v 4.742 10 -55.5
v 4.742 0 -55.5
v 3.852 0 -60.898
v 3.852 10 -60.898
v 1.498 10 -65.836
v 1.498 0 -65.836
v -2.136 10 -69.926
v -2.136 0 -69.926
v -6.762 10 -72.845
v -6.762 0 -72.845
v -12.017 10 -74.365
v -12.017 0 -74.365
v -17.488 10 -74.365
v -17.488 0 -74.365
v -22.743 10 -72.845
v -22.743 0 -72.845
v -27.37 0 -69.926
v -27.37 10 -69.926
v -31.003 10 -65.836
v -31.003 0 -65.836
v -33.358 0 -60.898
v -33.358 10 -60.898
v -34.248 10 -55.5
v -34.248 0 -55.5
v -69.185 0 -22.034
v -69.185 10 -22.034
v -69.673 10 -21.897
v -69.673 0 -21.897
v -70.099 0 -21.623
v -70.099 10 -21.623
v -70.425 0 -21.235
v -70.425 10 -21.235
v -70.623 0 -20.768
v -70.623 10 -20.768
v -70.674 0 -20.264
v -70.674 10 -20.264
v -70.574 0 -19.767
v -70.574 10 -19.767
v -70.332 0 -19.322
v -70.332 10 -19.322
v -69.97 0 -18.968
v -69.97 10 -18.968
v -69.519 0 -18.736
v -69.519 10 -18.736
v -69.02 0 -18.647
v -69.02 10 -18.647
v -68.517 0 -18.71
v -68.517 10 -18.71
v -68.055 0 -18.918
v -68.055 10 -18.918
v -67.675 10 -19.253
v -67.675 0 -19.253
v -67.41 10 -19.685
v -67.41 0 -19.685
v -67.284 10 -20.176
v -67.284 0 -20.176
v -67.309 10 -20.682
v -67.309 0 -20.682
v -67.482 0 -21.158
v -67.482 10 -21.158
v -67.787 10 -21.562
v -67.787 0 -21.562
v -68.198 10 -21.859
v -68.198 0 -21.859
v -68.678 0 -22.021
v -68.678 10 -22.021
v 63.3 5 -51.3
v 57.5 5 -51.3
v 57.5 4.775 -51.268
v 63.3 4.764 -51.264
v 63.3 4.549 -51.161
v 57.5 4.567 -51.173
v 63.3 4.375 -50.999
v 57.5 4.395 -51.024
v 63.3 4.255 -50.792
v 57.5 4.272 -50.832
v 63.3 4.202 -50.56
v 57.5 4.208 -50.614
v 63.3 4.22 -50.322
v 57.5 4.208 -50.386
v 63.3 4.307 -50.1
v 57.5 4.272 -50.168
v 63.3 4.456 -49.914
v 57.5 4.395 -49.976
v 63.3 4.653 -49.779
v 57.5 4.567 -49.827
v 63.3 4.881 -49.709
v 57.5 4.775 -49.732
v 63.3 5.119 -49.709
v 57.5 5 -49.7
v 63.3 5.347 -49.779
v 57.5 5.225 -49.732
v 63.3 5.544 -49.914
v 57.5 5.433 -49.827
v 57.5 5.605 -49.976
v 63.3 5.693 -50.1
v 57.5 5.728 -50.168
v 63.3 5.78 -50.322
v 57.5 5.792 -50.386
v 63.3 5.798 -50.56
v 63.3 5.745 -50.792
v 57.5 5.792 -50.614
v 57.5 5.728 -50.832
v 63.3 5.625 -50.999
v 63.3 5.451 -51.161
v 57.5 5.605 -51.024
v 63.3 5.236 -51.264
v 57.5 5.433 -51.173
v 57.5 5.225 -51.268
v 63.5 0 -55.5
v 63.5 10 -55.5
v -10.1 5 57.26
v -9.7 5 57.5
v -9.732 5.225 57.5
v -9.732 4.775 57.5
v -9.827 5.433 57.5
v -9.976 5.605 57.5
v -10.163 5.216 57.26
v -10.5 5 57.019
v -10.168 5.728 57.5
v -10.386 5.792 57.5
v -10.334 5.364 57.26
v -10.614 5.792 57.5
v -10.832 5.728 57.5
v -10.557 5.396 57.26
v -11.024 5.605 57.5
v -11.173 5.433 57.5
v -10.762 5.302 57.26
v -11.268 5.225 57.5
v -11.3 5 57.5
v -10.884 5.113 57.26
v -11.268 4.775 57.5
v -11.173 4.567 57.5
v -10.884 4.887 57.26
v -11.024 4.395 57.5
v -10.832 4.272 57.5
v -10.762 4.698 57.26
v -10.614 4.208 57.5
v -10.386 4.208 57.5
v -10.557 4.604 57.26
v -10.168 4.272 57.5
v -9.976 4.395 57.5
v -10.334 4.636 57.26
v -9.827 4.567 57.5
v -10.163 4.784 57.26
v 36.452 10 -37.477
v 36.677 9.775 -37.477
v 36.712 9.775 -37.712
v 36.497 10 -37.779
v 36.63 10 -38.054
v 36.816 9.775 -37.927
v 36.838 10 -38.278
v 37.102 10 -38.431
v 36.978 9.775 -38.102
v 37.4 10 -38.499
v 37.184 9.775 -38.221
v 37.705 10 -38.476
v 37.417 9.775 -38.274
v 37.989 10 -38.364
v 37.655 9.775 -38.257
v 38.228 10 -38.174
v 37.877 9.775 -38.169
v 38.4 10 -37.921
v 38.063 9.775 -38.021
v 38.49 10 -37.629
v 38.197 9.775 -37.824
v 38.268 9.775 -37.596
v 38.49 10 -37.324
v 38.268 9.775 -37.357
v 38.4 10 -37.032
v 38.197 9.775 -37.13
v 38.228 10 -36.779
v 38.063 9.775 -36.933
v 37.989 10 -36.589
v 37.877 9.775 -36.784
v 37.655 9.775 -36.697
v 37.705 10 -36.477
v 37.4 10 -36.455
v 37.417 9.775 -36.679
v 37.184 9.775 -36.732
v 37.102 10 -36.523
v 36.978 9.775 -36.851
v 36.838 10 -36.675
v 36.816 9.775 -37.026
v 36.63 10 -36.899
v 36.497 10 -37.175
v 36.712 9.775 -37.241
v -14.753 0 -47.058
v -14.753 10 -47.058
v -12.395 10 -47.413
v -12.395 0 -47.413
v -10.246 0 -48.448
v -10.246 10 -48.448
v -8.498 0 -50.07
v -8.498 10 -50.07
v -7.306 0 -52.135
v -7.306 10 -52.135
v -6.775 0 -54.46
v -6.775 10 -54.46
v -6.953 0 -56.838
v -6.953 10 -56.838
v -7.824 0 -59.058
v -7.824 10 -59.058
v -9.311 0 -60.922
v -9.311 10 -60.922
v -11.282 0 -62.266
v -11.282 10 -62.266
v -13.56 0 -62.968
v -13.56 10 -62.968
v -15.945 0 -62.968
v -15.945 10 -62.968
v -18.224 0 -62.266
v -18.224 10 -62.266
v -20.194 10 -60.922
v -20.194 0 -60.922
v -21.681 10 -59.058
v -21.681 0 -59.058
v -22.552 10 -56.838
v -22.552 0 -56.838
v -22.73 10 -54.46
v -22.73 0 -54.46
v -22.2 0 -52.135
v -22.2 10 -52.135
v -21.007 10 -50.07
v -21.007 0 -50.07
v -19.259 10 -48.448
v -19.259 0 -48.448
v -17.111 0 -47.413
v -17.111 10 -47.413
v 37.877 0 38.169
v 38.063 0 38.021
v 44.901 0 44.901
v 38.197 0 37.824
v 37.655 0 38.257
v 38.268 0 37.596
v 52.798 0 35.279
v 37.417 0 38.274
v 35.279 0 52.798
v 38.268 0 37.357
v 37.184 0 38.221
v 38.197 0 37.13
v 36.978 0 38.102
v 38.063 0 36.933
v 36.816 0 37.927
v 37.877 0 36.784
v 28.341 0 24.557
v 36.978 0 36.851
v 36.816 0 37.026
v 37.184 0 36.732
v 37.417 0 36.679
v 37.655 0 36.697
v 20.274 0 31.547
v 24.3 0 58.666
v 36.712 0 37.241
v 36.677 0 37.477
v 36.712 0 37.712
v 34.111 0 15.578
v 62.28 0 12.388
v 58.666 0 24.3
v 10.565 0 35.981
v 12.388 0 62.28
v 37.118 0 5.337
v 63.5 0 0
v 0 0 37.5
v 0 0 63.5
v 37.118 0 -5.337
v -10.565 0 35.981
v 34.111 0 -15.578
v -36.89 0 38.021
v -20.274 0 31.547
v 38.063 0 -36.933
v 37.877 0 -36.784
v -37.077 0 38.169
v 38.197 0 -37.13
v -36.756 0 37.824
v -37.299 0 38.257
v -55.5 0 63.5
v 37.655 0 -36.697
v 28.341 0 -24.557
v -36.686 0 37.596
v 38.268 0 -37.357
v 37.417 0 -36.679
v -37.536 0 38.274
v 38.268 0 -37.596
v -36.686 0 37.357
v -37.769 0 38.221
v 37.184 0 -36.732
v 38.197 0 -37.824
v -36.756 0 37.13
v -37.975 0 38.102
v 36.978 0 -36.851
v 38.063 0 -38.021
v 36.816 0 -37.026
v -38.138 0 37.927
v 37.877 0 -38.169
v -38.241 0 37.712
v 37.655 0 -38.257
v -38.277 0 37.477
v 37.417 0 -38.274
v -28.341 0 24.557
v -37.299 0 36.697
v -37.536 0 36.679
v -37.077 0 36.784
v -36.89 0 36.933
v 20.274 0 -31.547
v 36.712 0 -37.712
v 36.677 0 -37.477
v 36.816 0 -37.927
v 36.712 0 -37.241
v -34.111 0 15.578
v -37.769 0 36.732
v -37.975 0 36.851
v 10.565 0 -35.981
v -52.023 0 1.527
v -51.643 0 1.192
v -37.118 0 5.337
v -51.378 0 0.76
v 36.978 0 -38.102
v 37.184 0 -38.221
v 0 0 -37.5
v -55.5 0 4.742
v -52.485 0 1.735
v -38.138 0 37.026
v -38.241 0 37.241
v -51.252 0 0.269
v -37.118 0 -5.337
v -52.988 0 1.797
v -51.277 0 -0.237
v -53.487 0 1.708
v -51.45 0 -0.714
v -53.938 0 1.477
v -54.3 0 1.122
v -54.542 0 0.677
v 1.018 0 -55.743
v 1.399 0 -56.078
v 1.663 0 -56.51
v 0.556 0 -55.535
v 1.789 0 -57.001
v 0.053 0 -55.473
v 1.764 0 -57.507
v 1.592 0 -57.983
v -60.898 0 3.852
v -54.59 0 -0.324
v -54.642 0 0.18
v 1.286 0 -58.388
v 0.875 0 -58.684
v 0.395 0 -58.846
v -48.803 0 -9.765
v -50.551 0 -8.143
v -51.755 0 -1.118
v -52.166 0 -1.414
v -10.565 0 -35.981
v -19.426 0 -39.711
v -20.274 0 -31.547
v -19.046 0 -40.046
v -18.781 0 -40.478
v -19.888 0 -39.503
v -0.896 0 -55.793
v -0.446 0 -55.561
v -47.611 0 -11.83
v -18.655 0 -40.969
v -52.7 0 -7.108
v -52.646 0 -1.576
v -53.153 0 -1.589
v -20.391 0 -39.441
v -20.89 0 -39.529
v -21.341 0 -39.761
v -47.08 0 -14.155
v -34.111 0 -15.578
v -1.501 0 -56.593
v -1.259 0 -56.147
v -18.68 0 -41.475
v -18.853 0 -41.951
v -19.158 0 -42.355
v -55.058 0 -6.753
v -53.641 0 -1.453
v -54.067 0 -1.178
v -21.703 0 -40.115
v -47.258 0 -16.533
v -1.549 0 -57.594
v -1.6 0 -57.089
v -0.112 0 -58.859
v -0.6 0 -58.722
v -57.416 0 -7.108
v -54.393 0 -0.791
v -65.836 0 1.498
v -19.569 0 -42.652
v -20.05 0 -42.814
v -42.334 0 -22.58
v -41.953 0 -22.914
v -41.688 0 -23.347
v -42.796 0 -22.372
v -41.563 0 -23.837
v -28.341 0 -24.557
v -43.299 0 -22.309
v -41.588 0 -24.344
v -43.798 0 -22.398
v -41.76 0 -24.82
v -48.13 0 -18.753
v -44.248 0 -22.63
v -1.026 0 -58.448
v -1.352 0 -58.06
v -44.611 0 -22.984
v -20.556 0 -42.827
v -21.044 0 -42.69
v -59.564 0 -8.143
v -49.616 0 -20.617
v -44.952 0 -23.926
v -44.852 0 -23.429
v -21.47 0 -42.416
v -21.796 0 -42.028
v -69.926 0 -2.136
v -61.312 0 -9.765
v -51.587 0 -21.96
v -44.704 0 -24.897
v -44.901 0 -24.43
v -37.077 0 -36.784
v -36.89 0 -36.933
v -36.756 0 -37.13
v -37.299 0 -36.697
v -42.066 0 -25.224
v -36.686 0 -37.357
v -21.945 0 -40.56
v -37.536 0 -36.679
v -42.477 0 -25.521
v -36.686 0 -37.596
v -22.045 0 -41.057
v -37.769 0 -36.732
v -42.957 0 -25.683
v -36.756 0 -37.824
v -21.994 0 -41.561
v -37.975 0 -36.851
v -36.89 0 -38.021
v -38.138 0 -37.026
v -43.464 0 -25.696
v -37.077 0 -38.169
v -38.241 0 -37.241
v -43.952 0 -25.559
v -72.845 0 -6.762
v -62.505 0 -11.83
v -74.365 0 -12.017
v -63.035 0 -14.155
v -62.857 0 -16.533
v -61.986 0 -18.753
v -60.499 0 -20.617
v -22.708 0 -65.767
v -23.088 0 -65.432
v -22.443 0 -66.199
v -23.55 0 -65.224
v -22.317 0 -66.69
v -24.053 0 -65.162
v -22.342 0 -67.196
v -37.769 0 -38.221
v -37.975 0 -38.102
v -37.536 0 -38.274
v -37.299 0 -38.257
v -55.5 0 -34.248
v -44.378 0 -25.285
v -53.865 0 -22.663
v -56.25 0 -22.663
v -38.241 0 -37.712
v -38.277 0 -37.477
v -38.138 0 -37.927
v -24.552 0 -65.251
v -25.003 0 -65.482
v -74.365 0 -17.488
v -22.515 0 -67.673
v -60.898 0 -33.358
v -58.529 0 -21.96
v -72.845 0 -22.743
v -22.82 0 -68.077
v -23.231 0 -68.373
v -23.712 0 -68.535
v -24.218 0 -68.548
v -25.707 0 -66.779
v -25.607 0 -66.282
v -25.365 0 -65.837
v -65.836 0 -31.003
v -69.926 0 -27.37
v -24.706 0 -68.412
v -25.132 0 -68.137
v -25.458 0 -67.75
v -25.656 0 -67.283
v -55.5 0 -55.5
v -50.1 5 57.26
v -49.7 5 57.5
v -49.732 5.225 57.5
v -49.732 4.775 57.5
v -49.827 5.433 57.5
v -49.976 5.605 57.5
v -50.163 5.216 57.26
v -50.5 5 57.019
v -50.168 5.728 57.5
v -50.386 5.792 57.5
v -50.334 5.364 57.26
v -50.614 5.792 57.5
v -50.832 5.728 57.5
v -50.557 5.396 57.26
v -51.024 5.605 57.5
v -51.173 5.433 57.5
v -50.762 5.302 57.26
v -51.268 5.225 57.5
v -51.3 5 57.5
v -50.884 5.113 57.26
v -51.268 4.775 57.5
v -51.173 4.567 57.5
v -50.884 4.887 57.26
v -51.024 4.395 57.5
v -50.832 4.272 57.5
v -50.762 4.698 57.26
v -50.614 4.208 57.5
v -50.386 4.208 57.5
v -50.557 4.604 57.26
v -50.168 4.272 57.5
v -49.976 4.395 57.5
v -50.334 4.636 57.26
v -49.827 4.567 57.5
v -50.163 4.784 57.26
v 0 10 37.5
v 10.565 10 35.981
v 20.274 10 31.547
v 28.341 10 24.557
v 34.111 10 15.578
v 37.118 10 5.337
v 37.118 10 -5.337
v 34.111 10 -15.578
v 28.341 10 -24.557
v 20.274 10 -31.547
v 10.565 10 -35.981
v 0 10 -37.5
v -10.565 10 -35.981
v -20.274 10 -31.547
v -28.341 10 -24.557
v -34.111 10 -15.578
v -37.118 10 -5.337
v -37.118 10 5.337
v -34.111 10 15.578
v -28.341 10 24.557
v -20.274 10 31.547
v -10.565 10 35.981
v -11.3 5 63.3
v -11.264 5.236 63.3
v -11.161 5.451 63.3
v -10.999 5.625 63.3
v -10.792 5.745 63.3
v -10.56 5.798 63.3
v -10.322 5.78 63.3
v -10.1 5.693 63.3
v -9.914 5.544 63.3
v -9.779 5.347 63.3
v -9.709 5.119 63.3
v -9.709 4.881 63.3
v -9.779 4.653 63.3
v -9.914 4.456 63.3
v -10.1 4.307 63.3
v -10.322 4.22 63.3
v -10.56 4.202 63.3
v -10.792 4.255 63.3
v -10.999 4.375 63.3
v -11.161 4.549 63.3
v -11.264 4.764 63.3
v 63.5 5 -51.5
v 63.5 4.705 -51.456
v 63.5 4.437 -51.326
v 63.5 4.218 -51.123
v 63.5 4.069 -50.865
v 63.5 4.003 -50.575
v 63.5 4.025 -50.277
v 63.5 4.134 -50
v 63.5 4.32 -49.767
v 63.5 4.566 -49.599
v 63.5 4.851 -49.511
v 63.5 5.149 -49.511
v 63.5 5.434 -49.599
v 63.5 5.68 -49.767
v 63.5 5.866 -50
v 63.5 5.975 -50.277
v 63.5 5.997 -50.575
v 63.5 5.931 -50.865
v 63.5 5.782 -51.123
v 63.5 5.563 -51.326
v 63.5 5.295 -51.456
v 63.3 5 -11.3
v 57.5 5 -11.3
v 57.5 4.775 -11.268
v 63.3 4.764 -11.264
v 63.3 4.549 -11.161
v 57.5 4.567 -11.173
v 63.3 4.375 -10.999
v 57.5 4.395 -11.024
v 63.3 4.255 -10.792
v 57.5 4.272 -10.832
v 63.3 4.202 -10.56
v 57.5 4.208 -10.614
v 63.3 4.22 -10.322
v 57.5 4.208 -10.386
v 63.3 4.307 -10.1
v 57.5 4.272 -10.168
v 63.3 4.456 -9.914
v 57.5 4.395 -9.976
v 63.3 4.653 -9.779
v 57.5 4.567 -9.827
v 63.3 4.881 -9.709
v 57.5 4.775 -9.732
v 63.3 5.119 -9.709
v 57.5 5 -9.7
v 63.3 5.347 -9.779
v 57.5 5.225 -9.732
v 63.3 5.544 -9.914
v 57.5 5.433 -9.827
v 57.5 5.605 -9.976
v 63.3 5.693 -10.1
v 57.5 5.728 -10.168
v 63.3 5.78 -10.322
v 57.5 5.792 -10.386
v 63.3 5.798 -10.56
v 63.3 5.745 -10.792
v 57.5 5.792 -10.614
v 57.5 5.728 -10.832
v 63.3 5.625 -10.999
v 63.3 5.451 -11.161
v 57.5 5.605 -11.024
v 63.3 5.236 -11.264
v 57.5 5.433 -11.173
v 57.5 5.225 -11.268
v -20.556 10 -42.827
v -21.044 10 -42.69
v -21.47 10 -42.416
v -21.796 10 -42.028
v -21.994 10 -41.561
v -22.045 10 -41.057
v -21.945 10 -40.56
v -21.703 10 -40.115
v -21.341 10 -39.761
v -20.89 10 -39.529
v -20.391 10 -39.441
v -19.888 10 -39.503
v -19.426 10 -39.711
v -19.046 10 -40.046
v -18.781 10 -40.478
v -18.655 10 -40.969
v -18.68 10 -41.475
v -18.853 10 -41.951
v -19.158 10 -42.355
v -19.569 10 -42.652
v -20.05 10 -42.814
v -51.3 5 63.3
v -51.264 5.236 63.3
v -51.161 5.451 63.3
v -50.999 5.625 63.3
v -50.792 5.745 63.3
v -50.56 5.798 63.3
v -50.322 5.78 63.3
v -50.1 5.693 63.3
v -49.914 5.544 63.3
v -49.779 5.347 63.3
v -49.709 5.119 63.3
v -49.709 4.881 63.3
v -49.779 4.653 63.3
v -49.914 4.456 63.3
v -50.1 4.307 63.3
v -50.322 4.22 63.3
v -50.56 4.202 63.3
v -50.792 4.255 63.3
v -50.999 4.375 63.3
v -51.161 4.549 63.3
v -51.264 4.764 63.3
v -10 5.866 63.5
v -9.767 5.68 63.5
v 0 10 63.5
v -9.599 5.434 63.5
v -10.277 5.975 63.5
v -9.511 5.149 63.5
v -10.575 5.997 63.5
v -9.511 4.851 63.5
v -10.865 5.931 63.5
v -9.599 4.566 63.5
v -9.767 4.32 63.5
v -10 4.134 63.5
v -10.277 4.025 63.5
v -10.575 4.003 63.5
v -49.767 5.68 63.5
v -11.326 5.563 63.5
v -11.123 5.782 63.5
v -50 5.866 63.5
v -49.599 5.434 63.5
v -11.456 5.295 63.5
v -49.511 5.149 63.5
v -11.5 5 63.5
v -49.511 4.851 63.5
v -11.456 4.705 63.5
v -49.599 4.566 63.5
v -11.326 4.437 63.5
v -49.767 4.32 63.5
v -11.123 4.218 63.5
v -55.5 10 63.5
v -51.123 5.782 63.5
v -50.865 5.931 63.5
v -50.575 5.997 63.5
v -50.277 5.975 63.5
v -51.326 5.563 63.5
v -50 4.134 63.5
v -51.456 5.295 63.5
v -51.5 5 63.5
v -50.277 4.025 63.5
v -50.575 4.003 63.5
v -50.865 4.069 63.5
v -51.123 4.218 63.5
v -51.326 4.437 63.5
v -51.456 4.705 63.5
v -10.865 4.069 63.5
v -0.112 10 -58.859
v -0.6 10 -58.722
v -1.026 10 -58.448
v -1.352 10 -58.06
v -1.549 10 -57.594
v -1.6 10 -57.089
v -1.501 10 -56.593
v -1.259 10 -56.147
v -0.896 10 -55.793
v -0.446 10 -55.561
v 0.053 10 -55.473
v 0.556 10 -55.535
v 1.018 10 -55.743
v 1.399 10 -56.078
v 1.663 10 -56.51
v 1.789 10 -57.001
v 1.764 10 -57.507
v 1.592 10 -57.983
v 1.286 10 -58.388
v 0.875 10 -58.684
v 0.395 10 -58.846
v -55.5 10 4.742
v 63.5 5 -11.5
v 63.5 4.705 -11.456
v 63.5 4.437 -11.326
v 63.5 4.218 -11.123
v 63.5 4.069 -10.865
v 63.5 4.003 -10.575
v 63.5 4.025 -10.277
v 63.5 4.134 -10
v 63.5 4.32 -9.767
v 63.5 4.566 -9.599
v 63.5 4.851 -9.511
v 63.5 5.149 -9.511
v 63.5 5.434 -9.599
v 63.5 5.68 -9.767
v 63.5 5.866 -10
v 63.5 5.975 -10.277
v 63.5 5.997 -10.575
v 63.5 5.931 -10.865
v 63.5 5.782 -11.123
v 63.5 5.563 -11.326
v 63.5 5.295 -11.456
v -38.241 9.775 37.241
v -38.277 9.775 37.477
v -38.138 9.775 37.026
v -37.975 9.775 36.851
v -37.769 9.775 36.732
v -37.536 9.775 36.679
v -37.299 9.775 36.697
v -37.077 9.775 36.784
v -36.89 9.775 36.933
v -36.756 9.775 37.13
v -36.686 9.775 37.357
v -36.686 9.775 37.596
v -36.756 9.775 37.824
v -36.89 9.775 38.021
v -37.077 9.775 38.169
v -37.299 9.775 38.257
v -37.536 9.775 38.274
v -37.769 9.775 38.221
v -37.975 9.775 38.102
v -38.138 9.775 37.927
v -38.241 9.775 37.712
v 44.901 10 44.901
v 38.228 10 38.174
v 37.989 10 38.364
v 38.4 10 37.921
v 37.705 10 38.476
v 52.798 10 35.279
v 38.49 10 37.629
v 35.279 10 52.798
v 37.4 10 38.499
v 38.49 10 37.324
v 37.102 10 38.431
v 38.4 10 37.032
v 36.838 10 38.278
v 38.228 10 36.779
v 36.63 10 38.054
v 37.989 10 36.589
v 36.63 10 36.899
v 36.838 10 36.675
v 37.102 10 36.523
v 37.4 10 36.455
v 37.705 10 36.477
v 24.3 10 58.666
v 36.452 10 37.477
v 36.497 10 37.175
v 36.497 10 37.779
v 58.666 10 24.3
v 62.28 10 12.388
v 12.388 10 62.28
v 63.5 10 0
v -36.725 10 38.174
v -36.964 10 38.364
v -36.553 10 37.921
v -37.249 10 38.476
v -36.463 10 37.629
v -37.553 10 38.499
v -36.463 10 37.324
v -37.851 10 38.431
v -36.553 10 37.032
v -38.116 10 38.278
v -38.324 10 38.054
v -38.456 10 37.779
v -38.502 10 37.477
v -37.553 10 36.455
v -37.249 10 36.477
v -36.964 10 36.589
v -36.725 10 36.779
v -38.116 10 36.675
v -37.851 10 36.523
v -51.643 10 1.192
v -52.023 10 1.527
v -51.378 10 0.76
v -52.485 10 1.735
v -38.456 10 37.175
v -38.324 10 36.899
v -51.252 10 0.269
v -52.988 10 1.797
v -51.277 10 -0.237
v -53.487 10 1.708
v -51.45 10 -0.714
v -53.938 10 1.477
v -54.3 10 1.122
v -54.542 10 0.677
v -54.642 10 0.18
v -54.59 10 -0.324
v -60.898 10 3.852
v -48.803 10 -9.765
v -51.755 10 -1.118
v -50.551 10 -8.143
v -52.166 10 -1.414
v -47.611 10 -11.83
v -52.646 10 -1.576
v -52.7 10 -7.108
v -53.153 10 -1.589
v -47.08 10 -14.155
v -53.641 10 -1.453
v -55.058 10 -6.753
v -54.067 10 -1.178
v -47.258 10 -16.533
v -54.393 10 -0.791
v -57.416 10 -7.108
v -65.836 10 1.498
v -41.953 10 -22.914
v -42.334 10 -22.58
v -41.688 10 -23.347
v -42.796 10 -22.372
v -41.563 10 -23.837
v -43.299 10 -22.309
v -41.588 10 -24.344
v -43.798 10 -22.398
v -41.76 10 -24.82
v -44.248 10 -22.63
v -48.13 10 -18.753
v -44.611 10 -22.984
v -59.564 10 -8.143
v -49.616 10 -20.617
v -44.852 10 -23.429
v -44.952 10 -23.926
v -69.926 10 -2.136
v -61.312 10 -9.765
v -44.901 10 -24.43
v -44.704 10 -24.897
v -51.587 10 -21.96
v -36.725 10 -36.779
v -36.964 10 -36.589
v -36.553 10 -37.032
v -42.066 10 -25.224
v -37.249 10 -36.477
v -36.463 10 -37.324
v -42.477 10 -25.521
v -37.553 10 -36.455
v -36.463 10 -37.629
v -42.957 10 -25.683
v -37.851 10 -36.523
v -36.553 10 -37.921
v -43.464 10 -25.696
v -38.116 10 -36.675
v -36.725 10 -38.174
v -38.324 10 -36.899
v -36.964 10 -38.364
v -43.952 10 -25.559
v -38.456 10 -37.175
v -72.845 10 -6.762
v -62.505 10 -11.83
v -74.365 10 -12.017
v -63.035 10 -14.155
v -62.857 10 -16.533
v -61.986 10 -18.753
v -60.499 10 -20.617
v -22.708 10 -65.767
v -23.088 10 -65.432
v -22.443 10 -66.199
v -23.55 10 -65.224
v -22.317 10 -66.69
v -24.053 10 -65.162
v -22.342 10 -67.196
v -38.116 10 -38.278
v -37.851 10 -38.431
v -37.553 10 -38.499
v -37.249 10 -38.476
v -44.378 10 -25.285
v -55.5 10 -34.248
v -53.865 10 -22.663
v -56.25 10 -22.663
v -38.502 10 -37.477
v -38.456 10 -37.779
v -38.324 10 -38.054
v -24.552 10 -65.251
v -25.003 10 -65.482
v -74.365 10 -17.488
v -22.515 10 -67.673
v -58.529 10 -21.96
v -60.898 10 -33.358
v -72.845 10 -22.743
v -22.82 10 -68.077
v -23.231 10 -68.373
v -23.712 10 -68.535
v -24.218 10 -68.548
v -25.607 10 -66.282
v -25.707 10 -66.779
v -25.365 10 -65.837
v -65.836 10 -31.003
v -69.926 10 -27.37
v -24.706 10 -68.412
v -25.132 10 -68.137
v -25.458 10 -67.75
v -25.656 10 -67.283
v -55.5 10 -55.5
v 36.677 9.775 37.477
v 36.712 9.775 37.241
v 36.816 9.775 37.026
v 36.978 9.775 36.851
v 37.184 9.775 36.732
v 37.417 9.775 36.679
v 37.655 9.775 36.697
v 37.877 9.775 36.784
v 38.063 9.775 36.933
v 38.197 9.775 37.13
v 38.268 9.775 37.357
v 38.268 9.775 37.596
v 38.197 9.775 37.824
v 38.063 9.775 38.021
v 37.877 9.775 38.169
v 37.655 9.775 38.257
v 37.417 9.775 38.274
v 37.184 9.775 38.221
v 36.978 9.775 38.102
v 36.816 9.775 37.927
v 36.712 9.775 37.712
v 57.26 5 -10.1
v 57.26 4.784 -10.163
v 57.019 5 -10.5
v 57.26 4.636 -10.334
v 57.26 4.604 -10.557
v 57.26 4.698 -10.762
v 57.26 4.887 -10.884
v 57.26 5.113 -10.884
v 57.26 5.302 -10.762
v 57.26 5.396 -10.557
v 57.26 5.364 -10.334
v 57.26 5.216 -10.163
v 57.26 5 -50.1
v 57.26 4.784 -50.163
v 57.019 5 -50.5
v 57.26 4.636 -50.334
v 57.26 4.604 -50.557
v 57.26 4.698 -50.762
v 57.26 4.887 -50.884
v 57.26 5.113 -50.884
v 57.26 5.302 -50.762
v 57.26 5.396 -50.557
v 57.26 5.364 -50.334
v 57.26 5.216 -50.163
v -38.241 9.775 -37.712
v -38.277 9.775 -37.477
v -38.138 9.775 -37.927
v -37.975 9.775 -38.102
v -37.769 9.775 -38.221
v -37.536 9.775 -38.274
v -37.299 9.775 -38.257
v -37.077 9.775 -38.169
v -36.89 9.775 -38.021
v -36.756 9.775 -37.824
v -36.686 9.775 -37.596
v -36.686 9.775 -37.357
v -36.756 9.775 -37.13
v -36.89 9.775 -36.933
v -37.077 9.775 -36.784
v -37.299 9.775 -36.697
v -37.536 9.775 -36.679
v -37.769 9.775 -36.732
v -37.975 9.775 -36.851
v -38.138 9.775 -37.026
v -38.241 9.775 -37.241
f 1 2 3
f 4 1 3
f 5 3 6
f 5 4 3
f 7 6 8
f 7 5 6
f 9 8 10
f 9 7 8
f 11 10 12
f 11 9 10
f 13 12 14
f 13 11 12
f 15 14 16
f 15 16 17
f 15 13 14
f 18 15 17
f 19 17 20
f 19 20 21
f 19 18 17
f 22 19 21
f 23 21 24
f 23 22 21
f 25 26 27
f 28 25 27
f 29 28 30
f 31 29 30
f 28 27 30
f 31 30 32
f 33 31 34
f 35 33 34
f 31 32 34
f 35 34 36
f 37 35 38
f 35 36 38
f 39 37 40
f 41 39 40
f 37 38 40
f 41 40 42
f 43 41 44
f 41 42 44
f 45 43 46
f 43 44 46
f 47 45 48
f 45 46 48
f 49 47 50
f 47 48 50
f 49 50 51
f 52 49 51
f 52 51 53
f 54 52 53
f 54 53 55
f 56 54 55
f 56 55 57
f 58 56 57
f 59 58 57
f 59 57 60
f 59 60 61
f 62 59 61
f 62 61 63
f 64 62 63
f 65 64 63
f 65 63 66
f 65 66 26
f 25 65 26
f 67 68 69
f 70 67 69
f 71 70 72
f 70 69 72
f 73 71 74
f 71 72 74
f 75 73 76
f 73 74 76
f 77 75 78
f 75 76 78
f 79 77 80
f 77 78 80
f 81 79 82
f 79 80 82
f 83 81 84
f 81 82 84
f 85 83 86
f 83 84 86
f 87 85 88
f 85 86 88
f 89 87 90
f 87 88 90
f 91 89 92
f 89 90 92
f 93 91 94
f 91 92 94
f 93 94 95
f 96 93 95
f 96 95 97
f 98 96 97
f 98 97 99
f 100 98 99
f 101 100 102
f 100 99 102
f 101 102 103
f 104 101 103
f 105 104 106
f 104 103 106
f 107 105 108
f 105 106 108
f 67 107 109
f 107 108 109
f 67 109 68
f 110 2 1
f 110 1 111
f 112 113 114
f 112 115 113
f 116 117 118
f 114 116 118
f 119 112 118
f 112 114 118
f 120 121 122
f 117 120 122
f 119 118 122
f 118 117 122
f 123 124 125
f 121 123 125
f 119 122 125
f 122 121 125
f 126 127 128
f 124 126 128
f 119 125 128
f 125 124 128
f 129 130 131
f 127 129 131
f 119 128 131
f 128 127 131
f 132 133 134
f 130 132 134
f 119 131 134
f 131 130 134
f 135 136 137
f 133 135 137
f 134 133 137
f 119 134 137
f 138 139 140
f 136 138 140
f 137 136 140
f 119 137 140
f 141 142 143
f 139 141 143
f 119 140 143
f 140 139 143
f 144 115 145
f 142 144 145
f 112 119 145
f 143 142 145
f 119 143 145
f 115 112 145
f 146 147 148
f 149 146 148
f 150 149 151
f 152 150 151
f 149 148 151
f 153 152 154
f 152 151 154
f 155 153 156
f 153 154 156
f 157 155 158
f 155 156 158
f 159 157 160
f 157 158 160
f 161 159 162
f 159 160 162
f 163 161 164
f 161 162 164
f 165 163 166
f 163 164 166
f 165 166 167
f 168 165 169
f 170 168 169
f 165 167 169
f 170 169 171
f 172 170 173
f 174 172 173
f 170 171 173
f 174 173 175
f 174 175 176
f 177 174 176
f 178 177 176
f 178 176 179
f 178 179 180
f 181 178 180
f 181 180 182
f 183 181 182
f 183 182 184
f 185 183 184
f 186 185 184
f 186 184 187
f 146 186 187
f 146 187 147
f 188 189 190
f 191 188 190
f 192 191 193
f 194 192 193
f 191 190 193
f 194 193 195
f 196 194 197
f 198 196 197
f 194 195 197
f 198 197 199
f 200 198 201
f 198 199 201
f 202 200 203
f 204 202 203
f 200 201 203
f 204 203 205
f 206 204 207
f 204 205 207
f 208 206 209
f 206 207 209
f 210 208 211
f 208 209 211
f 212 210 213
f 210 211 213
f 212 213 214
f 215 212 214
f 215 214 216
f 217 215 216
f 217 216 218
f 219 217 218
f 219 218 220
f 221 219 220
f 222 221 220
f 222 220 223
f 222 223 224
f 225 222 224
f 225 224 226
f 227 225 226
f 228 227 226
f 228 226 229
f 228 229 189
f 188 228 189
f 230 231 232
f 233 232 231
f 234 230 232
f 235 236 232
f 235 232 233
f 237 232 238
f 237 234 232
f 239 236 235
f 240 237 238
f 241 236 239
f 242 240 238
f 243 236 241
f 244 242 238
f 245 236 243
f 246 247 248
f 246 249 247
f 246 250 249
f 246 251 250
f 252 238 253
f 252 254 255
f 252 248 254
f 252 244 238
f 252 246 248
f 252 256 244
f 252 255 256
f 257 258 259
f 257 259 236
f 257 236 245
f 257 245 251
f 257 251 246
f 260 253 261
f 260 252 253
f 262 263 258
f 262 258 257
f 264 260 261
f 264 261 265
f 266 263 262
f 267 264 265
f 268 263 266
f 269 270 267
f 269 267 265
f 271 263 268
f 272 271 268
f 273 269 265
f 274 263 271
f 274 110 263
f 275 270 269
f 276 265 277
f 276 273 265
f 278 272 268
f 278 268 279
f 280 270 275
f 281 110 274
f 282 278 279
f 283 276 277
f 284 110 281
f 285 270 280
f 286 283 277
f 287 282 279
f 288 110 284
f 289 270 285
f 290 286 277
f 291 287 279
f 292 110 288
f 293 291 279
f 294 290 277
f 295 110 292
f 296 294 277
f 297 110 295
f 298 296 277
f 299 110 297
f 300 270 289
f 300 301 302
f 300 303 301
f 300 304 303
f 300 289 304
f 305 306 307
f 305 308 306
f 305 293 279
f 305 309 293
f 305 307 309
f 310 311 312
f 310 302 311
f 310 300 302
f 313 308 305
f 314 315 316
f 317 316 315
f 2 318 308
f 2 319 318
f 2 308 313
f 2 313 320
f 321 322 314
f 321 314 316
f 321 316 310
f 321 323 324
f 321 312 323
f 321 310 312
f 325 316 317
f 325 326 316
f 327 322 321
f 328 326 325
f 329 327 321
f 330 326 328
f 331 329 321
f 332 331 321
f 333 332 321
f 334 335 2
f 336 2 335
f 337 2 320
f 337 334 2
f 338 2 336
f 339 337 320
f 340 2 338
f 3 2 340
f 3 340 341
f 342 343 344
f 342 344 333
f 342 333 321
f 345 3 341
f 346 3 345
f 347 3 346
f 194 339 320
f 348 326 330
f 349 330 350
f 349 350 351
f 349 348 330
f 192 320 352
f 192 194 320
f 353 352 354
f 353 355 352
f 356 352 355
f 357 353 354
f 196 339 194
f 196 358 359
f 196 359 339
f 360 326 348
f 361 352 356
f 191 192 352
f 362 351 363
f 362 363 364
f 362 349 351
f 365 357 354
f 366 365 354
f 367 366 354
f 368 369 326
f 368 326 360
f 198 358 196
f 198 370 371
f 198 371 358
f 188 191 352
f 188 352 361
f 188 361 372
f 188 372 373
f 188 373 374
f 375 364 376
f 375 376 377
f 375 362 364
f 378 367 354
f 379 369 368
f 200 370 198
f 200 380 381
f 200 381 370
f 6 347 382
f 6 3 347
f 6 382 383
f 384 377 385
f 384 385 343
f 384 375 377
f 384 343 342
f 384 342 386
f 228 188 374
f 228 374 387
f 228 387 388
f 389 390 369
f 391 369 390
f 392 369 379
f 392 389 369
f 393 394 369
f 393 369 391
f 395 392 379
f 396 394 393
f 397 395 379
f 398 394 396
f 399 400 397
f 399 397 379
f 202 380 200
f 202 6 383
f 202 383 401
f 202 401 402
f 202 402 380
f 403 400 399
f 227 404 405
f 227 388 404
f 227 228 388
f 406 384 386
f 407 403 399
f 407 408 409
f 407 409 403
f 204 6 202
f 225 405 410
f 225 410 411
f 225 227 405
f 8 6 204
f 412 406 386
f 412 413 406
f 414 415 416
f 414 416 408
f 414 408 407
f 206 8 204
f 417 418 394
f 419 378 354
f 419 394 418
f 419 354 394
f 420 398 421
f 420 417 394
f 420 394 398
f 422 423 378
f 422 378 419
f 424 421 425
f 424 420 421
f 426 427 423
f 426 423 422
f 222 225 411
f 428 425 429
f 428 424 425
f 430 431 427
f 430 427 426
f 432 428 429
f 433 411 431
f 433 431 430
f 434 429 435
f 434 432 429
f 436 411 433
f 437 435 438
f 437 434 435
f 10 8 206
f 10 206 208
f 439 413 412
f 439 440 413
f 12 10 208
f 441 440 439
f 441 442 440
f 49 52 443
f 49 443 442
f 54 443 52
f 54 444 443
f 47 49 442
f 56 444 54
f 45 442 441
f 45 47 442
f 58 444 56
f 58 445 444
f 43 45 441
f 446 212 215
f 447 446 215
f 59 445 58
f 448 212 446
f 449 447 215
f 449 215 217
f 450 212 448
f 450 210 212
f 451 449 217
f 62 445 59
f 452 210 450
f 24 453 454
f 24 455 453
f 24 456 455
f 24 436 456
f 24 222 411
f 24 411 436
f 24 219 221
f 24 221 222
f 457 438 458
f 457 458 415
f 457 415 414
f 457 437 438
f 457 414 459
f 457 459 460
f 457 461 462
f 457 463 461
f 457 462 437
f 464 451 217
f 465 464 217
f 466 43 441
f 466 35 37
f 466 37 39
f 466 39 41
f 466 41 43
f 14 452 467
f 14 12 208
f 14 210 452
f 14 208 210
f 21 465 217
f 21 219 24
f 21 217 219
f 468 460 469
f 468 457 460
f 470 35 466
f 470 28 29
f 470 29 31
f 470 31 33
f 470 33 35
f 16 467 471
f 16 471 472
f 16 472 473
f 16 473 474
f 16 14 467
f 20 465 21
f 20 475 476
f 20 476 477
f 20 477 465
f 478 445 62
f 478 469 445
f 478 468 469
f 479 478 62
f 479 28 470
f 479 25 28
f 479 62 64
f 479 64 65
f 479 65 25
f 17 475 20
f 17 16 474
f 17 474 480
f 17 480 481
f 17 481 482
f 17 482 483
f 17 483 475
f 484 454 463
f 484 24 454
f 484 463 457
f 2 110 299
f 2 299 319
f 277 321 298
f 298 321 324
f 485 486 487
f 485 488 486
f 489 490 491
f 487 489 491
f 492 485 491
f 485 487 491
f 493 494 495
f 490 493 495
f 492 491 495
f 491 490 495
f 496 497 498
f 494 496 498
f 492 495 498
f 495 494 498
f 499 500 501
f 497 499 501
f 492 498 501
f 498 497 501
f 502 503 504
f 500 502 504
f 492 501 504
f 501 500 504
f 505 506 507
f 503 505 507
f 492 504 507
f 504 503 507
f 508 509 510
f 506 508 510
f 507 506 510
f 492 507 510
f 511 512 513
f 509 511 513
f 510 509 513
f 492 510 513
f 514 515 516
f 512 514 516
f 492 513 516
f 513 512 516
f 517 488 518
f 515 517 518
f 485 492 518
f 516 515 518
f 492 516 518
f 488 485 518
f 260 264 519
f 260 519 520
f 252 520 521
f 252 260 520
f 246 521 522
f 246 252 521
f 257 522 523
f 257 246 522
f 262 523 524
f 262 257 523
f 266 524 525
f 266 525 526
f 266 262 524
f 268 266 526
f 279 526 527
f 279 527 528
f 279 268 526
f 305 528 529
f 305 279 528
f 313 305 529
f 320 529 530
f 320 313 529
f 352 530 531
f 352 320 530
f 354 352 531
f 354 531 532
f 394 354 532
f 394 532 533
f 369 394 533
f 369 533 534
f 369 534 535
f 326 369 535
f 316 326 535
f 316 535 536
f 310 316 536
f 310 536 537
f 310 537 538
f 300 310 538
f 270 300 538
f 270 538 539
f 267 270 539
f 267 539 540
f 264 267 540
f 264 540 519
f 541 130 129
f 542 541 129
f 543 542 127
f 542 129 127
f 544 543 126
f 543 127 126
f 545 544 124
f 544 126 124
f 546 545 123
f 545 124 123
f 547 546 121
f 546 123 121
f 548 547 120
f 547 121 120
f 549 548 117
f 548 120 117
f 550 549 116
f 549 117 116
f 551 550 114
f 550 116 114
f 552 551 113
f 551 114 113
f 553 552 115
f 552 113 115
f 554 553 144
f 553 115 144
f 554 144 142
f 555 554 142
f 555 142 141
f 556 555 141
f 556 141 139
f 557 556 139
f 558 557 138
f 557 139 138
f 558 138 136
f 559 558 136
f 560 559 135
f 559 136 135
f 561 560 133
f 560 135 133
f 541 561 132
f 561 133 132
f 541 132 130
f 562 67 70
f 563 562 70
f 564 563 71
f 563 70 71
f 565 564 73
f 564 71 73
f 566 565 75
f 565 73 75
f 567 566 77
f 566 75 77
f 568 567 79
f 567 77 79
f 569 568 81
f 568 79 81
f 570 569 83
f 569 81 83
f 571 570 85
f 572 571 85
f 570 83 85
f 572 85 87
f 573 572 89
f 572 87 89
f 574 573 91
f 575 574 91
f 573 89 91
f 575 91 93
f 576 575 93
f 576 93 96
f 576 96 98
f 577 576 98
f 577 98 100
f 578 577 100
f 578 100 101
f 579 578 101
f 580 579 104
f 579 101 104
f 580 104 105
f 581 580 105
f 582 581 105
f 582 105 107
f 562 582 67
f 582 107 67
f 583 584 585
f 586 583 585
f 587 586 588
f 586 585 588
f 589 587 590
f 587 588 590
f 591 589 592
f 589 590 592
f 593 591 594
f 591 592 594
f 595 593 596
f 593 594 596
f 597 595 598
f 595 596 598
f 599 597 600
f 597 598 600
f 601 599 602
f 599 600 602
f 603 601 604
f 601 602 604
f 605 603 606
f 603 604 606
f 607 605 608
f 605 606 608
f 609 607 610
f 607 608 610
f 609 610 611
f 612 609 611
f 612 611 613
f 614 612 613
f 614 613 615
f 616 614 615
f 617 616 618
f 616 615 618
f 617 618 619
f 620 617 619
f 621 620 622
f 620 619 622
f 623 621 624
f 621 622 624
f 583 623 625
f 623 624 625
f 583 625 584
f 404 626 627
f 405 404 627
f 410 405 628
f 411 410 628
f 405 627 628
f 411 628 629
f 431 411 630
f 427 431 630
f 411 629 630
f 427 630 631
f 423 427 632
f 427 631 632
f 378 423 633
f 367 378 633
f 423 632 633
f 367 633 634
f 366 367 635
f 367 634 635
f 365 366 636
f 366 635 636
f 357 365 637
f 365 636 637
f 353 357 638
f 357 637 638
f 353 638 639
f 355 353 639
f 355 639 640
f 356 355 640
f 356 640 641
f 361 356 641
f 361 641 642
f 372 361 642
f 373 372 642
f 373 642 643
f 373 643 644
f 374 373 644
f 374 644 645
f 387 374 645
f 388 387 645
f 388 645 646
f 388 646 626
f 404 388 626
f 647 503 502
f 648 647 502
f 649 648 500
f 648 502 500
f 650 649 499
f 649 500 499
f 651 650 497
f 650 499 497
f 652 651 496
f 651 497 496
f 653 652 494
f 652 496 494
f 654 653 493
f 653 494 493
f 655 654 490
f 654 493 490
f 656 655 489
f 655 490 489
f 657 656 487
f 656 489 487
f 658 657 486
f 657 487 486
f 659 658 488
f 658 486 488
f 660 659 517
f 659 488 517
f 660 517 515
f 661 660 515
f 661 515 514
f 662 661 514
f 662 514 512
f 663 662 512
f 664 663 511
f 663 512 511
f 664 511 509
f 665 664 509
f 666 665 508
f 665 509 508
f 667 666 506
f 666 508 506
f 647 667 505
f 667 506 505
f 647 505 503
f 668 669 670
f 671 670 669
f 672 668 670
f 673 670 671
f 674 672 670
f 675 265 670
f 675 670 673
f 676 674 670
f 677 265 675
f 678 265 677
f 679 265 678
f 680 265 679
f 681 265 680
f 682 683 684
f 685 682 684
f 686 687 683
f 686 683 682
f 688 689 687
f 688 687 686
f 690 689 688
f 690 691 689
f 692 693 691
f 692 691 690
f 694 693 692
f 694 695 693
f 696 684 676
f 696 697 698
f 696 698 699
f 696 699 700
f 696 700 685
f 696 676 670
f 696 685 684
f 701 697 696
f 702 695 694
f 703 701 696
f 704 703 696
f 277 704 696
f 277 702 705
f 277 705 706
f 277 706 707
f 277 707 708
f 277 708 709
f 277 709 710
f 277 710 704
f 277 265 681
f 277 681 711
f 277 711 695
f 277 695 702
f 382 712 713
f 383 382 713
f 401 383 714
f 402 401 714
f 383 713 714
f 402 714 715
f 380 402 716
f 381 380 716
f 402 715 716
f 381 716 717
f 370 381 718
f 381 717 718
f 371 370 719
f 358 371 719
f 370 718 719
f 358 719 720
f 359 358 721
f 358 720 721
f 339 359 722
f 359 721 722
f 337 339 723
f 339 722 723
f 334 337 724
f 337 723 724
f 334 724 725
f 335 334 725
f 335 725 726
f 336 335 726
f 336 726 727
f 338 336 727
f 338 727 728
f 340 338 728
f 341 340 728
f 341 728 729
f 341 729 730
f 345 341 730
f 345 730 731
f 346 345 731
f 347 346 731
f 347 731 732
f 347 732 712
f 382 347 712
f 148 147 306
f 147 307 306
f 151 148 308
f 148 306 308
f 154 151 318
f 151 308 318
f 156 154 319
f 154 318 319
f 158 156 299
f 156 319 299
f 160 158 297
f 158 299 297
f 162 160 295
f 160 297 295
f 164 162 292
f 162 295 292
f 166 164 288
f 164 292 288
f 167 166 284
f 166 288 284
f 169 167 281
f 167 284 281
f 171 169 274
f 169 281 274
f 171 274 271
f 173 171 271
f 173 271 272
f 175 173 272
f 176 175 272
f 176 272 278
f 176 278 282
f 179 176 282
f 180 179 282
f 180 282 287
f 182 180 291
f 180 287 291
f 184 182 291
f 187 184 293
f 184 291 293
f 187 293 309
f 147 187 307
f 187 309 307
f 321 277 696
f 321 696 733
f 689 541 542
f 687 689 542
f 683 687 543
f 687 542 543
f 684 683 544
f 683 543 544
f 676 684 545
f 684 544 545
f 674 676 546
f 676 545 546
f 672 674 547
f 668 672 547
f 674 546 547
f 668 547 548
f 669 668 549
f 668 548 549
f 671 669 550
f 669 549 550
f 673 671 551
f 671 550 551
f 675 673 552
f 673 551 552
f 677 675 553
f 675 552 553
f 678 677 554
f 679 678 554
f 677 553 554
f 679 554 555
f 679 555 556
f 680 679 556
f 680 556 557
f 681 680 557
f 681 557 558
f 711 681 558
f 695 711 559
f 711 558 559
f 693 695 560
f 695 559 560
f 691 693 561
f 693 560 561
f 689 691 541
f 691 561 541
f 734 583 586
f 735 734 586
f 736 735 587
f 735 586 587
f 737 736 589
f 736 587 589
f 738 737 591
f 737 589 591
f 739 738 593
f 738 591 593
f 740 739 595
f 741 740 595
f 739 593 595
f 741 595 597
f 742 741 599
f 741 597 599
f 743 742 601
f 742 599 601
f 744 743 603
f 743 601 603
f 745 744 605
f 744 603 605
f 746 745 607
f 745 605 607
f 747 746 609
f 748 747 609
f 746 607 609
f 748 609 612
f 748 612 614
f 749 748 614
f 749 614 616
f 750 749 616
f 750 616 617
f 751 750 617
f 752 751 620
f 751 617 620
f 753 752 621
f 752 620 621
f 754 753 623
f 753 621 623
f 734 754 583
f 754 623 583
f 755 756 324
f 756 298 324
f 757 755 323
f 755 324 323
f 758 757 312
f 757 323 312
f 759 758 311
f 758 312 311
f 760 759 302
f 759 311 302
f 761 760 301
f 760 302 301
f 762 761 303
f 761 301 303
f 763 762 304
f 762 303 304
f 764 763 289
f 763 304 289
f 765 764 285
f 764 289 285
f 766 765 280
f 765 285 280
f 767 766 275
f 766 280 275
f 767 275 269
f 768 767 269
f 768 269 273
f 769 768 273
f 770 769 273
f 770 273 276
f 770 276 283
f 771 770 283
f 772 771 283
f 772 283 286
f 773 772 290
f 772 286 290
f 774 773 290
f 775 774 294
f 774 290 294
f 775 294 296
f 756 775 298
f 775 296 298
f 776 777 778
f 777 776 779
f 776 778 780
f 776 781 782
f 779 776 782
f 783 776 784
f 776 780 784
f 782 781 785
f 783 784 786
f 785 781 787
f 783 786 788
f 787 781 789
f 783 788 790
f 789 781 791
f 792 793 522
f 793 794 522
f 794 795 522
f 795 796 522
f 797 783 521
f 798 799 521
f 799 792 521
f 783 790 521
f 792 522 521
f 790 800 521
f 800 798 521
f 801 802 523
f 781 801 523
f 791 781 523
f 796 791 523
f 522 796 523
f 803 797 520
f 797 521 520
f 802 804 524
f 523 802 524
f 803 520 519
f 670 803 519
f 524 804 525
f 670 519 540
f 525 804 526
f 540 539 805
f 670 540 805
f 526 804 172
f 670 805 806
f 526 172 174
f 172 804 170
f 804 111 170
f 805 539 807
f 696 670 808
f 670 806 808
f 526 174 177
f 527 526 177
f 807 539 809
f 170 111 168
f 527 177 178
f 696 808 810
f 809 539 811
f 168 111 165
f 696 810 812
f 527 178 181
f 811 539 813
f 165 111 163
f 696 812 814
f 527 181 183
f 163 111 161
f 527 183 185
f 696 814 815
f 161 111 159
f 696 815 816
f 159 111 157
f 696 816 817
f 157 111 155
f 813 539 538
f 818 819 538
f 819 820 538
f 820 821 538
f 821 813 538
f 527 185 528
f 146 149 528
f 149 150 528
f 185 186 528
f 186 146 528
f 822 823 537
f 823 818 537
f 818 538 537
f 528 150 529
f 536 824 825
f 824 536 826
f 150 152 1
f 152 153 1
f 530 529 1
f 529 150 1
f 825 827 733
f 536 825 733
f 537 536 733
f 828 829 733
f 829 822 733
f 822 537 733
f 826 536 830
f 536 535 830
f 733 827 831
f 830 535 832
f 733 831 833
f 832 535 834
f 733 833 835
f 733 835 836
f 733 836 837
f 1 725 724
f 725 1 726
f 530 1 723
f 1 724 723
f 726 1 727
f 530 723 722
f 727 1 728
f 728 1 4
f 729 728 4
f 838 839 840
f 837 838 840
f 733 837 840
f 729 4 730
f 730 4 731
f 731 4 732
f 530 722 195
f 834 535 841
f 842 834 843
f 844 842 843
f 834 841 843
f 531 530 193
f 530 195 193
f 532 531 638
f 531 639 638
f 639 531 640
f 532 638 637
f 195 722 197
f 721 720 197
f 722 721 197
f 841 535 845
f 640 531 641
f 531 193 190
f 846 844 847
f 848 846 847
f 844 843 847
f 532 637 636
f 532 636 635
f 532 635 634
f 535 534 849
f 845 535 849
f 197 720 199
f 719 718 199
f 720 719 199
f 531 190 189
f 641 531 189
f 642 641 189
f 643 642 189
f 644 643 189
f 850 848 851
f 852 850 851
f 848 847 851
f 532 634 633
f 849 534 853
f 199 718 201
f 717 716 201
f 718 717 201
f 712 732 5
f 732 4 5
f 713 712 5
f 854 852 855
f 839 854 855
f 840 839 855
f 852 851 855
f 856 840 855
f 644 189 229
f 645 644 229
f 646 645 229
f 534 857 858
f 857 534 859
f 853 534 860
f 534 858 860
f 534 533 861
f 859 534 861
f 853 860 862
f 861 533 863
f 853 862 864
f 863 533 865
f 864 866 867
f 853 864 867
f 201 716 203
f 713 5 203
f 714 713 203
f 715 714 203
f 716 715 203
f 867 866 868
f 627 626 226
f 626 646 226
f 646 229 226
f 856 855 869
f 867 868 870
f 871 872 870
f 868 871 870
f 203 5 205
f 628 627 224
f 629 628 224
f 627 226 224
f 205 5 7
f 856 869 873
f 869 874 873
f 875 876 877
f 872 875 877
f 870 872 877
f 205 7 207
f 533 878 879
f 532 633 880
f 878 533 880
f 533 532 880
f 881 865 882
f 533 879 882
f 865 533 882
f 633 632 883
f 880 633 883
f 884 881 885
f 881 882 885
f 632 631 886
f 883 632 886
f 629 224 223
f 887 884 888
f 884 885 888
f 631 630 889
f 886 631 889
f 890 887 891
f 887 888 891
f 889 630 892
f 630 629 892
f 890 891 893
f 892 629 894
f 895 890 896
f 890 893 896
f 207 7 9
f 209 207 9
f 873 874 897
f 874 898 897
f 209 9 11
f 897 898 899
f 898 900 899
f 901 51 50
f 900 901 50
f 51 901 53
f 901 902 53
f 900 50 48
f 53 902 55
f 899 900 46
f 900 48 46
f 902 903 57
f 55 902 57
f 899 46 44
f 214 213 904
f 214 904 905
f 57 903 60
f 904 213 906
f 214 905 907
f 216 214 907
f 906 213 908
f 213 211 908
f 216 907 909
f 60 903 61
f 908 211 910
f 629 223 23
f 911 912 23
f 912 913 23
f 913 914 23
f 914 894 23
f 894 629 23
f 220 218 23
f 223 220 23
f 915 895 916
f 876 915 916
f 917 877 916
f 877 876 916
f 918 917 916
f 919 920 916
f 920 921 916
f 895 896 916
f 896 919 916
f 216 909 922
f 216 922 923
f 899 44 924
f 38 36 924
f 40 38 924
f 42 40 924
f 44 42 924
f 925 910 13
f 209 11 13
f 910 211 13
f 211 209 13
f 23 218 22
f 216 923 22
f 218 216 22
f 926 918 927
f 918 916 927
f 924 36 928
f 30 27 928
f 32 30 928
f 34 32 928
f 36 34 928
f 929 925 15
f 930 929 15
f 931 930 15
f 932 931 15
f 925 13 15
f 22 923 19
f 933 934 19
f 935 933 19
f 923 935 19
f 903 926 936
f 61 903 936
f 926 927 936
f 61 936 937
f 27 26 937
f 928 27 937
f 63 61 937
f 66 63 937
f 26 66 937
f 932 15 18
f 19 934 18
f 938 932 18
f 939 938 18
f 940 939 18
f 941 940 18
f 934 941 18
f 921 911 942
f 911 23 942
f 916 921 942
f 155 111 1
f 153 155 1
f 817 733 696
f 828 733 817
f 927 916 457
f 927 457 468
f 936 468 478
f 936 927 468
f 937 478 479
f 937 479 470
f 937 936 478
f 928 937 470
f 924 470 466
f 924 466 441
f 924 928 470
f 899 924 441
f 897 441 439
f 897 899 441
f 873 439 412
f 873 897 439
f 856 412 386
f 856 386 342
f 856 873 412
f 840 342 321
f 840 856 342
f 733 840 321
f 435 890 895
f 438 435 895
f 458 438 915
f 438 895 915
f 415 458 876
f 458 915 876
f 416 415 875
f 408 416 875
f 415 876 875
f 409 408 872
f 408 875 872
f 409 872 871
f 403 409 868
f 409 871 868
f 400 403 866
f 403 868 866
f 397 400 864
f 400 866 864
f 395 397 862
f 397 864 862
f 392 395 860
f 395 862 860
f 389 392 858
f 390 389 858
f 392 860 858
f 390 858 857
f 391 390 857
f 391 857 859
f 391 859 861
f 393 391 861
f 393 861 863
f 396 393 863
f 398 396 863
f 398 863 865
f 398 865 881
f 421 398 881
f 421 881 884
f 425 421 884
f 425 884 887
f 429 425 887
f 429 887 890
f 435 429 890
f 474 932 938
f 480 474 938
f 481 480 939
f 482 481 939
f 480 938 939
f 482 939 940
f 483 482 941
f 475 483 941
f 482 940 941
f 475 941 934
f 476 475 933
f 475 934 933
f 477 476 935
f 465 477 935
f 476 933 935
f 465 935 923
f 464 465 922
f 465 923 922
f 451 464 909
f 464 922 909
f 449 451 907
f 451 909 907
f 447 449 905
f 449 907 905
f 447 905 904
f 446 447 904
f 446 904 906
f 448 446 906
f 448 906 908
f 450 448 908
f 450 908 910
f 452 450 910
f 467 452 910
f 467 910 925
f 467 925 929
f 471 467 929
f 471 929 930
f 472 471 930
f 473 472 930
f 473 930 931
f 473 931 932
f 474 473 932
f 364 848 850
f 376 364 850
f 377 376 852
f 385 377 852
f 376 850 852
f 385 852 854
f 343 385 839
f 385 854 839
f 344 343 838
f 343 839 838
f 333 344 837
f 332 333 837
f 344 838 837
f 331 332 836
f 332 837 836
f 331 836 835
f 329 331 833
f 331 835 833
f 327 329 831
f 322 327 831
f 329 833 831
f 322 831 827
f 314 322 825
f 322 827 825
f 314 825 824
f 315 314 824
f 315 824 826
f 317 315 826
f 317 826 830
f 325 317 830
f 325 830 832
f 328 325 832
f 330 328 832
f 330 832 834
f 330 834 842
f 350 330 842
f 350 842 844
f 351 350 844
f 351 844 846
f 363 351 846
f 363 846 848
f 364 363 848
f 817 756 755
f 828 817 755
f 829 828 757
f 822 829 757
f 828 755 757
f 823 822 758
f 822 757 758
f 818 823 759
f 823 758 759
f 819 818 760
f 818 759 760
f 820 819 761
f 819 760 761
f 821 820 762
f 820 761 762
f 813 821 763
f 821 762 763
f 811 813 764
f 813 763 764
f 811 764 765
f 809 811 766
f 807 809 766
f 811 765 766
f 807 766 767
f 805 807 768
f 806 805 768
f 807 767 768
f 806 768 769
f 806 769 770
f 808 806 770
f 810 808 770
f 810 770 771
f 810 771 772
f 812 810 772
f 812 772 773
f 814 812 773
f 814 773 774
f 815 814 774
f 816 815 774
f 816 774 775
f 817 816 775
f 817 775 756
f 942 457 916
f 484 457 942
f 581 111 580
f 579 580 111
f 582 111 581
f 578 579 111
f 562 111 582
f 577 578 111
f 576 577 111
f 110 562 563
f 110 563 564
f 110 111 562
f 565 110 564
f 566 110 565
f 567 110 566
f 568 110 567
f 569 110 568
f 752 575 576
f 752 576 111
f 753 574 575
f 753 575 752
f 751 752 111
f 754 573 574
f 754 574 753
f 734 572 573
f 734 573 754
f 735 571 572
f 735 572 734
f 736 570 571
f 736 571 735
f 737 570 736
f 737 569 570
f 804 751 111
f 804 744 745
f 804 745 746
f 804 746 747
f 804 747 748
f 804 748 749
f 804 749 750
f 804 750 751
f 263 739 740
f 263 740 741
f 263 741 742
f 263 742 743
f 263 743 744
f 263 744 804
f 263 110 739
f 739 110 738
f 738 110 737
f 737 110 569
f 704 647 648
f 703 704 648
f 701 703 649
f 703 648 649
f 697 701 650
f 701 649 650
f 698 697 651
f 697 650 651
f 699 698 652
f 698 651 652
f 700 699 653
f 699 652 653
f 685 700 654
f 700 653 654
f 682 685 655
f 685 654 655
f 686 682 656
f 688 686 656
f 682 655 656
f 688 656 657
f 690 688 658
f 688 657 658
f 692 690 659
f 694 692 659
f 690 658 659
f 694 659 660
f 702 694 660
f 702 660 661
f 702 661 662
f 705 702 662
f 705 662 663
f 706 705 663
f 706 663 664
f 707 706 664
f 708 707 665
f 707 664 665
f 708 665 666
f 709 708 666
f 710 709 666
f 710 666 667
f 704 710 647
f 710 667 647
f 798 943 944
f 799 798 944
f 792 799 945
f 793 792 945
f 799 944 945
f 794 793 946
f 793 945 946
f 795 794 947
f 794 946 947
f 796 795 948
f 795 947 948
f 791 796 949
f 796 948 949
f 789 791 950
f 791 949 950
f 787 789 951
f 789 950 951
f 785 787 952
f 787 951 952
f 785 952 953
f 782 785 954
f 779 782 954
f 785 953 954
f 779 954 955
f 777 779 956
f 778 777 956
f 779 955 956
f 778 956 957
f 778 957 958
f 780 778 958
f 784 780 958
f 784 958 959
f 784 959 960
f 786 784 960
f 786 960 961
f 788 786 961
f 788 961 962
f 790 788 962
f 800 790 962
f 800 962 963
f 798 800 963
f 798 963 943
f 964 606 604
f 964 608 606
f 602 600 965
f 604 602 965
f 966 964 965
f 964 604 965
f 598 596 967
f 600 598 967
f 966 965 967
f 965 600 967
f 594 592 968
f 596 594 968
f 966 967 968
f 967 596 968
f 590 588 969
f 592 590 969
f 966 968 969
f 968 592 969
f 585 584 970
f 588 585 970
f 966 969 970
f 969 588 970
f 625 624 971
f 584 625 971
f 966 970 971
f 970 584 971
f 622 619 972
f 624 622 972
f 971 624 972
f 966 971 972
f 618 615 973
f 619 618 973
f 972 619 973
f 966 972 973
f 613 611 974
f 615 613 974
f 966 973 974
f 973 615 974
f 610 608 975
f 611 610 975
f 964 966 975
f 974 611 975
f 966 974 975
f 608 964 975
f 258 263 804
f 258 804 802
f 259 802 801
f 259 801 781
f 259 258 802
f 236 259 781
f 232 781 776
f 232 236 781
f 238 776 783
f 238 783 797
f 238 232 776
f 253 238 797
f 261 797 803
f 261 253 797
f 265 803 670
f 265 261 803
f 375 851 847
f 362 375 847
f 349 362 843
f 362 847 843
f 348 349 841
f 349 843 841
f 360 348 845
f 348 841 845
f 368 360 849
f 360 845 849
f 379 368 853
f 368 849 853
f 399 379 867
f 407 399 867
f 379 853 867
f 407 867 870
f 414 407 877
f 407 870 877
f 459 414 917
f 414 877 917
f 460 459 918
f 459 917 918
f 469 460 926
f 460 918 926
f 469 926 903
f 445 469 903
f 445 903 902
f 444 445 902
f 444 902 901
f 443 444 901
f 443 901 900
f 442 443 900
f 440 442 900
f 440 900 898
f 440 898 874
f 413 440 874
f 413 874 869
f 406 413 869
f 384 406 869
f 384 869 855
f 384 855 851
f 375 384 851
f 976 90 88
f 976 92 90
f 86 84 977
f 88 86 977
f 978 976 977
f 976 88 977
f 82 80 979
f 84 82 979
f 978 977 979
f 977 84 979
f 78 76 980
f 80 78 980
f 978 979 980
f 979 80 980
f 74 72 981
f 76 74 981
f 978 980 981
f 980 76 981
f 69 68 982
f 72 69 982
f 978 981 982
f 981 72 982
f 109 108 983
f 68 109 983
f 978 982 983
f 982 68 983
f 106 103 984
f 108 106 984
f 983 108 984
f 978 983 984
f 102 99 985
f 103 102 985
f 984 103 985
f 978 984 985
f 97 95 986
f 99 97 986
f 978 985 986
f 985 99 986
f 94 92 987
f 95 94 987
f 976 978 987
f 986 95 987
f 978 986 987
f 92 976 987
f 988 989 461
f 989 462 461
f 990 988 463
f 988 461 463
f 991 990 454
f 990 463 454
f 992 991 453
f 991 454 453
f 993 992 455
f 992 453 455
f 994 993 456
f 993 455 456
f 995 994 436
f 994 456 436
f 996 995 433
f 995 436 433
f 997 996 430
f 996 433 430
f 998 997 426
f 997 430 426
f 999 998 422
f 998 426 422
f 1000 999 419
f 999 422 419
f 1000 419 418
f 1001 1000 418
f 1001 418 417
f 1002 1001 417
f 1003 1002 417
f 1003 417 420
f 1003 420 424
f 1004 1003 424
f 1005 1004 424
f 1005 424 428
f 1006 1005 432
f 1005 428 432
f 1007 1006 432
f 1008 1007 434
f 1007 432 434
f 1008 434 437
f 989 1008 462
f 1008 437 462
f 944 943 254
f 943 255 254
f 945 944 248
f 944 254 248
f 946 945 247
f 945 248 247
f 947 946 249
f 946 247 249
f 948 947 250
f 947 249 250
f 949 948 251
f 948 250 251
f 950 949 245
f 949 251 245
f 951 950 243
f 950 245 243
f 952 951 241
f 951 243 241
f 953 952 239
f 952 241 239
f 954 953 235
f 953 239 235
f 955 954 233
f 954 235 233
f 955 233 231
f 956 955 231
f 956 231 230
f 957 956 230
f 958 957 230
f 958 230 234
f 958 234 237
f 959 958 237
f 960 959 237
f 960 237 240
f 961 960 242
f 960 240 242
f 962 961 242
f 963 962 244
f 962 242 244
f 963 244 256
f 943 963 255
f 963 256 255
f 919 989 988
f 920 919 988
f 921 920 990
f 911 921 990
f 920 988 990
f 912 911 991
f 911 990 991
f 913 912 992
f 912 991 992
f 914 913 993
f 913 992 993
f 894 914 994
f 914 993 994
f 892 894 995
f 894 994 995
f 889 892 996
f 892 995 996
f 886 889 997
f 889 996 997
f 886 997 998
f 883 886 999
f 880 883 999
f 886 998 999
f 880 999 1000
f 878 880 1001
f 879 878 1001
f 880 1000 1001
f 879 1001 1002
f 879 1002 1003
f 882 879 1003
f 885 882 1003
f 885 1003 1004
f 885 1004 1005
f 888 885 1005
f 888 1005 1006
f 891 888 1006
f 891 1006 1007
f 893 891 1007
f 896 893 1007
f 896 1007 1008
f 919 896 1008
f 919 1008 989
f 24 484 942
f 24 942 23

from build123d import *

# Parameters (mm, degrees)
SKETCH1_R                           = 37.5
BOSS_EXTRUDE1_DEPTH                 = 10
M2X0_4_TAPPED_HOLE2_D               = 1.6
M2X0_4_TAPPED_HOLE2_CSINK_D         = 2.05
M2X0_4_TAPPED_HOLE2_CSINK_ANGLE     = 90
M2X0_4_TAPPED_HOLE1_D               = 1.6
M2X0_4_TAPPED_HOLE1_DEPTH           = 6
M2X0_4_TAPPED_HOLE1_TIP             = 0.480688495
M2X0_4_TAPPED_HOLE1_ON_FACE_2_D     = 1.6
M2X0_4_TAPPED_HOLE1_ON_FACE_2_DEPTH = 6
M2X0_4_TAPPED_HOLE1_ON_FACE_2_TIP   = 0.480688495
CHAMFER1_SIZE                       = 0.2
SKETCH11_R                          = 19.5
BOSS_EXTRUDE2_DEPTH                 = 10
SKETCH12_R                          = 8
CUT_EXTRUDE1_DEPTH                  = 106.913751518
M3_CLEARANCE_HOLE1_D                = 3.4


with BuildPart() as part:
    # Sketch1 → Boss-Extrude1 (new body)
    with BuildSketch(Plane(origin=(0, 0, 0), x_dir=(1, 0, 0), z_dir=(0, 1, 0))):
        with BuildLine():
            Line((-55.5, 55.5), (63.5, 55.5))
            Line((63.5, 55.5), (63.5, 0))
            ThreePointArc((63.5, 0), (44.901280605, -44.901280605), (0, -63.5))
            Line((0, -63.5), (-55.5, -63.5))
            Line((-55.5, -63.5), (-55.5, 55.5))
        make_face()
        with Locations(Location((0, 0, 0), (0, 0, 270))):
            Circle(SKETCH1_R, mode=Mode.SUBTRACT)
    extrude(amount=BOSS_EXTRUDE1_DEPTH)

    # M2x0.4 Tapped Hole2 (through all)
    with Locations(Plane(origin=(0, 10, 0), x_dir=(1, 0, 0), z_dir=(0, 1, 0))):
        with Locations((37.476659403, 37.476659403), (-37.476659403, 37.476659403), (-37.476659403, -37.476659403), (37.476659403, -37.476659403)):
            CounterSinkHole(M2X0_4_TAPPED_HOLE2_D / 2, M2X0_4_TAPPED_HOLE2_CSINK_D / 2, counter_sink_angle=M2X0_4_TAPPED_HOLE2_CSINK_ANGLE)

    # M2x0.4 Tapped Hole1
    with Locations(Plane(origin=(63.5, 5, -50.5), x_dir=(0, 0, 1), z_dir=(1, 0, 0))):
        with Locations((0, 0), (40, 0)):
            Hole(M2X0_4_TAPPED_HOLE1_D / 2, depth=M2X0_4_TAPPED_HOLE1_DEPTH)
            with Locations((0, 0, -(M2X0_4_TAPPED_HOLE1_DEPTH + M2X0_4_TAPPED_HOLE1_TIP / 2))):  # 118° drill point
                Cone(0, M2X0_4_TAPPED_HOLE1_D / 2, M2X0_4_TAPPED_HOLE1_TIP, mode=Mode.SUBTRACT)

    # M2x0.4 Tapped Hole1 on face 2
    with Locations(Plane(origin=(-50.5, 5, 63.5), x_dir=(1, 0, 0), z_dir=(0, 0, 1))):
        with Locations((0, 0), (40, 0)):
            Hole(M2X0_4_TAPPED_HOLE1_ON_FACE_2_D / 2, depth=M2X0_4_TAPPED_HOLE1_ON_FACE_2_DEPTH)
            with Locations((0, 0, -(M2X0_4_TAPPED_HOLE1_ON_FACE_2_DEPTH + M2X0_4_TAPPED_HOLE1_ON_FACE_2_TIP / 2))):  # 118° drill point
                Cone(0, M2X0_4_TAPPED_HOLE1_ON_FACE_2_D / 2, M2X0_4_TAPPED_HOLE1_ON_FACE_2_TIP, mode=Mode.SUBTRACT)

    # Chamfer1
    chamfer1_edges = [part.edges().sort_by_distance(p)[0] for p in [
        (-9.7, 5, 63.5),
        (-49.7, 5, 63.5),
        (63.5, 5, -9.7),
        (63.5, 5, -49.7),
    ]]
    chamfer(chamfer1_edges, length=CHAMFER1_SIZE)

    # Sketch11 → Boss-Extrude2 (add, through all)
    with BuildSketch(Plane(origin=(0, 10, 0), x_dir=(1, 0, 0), z_dir=(0, 1, 0))):
        with Locations((-14.752685571, 55.057772098)):
            Circle(SKETCH11_R)
        with Locations((-55.057772098, 14.752685571)):
            Circle(SKETCH11_R)
    extrude(amount=-BOSS_EXTRUDE2_DEPTH)

    # Sketch12 → Cut-Extrude1 (cut, through all)
    with BuildSketch(Plane(origin=(0, 10, 0), x_dir=(1, 0, 0), z_dir=(0, 1, 0))):
        with Locations(Location((-14.752685571, 55.057772098, 0), (0, 0, 270))):
            Circle(SKETCH12_R)
        with Locations(Location((-55.057772098, 14.752685571, 0), (0, 0, 270))):
            Circle(SKETCH12_R)
    extrude(amount=-CUT_EXTRUDE1_DEPTH, mode=Mode.SUBTRACT)

    # M3 Clearance Hole1 (through all)
    with Locations(Plane(origin=(1225.129186233, 0, -788.179357161), x_dir=(0.12314040674573719, 0, 0.992389258419545), z_dir=(0, -1, 0))):
        with Locations((602.6321738, 1378.806890422), (624.895157282, 1365.414371373), (602.165403824, 1352.830321638), (587.985457399, 1327.987745968), (574.59293835, 1305.724762486), (562.008888615, 1328.454515944)):
            Hole(M3_CLEARANCE_HOLE1_D / 2)


solid = part.part
